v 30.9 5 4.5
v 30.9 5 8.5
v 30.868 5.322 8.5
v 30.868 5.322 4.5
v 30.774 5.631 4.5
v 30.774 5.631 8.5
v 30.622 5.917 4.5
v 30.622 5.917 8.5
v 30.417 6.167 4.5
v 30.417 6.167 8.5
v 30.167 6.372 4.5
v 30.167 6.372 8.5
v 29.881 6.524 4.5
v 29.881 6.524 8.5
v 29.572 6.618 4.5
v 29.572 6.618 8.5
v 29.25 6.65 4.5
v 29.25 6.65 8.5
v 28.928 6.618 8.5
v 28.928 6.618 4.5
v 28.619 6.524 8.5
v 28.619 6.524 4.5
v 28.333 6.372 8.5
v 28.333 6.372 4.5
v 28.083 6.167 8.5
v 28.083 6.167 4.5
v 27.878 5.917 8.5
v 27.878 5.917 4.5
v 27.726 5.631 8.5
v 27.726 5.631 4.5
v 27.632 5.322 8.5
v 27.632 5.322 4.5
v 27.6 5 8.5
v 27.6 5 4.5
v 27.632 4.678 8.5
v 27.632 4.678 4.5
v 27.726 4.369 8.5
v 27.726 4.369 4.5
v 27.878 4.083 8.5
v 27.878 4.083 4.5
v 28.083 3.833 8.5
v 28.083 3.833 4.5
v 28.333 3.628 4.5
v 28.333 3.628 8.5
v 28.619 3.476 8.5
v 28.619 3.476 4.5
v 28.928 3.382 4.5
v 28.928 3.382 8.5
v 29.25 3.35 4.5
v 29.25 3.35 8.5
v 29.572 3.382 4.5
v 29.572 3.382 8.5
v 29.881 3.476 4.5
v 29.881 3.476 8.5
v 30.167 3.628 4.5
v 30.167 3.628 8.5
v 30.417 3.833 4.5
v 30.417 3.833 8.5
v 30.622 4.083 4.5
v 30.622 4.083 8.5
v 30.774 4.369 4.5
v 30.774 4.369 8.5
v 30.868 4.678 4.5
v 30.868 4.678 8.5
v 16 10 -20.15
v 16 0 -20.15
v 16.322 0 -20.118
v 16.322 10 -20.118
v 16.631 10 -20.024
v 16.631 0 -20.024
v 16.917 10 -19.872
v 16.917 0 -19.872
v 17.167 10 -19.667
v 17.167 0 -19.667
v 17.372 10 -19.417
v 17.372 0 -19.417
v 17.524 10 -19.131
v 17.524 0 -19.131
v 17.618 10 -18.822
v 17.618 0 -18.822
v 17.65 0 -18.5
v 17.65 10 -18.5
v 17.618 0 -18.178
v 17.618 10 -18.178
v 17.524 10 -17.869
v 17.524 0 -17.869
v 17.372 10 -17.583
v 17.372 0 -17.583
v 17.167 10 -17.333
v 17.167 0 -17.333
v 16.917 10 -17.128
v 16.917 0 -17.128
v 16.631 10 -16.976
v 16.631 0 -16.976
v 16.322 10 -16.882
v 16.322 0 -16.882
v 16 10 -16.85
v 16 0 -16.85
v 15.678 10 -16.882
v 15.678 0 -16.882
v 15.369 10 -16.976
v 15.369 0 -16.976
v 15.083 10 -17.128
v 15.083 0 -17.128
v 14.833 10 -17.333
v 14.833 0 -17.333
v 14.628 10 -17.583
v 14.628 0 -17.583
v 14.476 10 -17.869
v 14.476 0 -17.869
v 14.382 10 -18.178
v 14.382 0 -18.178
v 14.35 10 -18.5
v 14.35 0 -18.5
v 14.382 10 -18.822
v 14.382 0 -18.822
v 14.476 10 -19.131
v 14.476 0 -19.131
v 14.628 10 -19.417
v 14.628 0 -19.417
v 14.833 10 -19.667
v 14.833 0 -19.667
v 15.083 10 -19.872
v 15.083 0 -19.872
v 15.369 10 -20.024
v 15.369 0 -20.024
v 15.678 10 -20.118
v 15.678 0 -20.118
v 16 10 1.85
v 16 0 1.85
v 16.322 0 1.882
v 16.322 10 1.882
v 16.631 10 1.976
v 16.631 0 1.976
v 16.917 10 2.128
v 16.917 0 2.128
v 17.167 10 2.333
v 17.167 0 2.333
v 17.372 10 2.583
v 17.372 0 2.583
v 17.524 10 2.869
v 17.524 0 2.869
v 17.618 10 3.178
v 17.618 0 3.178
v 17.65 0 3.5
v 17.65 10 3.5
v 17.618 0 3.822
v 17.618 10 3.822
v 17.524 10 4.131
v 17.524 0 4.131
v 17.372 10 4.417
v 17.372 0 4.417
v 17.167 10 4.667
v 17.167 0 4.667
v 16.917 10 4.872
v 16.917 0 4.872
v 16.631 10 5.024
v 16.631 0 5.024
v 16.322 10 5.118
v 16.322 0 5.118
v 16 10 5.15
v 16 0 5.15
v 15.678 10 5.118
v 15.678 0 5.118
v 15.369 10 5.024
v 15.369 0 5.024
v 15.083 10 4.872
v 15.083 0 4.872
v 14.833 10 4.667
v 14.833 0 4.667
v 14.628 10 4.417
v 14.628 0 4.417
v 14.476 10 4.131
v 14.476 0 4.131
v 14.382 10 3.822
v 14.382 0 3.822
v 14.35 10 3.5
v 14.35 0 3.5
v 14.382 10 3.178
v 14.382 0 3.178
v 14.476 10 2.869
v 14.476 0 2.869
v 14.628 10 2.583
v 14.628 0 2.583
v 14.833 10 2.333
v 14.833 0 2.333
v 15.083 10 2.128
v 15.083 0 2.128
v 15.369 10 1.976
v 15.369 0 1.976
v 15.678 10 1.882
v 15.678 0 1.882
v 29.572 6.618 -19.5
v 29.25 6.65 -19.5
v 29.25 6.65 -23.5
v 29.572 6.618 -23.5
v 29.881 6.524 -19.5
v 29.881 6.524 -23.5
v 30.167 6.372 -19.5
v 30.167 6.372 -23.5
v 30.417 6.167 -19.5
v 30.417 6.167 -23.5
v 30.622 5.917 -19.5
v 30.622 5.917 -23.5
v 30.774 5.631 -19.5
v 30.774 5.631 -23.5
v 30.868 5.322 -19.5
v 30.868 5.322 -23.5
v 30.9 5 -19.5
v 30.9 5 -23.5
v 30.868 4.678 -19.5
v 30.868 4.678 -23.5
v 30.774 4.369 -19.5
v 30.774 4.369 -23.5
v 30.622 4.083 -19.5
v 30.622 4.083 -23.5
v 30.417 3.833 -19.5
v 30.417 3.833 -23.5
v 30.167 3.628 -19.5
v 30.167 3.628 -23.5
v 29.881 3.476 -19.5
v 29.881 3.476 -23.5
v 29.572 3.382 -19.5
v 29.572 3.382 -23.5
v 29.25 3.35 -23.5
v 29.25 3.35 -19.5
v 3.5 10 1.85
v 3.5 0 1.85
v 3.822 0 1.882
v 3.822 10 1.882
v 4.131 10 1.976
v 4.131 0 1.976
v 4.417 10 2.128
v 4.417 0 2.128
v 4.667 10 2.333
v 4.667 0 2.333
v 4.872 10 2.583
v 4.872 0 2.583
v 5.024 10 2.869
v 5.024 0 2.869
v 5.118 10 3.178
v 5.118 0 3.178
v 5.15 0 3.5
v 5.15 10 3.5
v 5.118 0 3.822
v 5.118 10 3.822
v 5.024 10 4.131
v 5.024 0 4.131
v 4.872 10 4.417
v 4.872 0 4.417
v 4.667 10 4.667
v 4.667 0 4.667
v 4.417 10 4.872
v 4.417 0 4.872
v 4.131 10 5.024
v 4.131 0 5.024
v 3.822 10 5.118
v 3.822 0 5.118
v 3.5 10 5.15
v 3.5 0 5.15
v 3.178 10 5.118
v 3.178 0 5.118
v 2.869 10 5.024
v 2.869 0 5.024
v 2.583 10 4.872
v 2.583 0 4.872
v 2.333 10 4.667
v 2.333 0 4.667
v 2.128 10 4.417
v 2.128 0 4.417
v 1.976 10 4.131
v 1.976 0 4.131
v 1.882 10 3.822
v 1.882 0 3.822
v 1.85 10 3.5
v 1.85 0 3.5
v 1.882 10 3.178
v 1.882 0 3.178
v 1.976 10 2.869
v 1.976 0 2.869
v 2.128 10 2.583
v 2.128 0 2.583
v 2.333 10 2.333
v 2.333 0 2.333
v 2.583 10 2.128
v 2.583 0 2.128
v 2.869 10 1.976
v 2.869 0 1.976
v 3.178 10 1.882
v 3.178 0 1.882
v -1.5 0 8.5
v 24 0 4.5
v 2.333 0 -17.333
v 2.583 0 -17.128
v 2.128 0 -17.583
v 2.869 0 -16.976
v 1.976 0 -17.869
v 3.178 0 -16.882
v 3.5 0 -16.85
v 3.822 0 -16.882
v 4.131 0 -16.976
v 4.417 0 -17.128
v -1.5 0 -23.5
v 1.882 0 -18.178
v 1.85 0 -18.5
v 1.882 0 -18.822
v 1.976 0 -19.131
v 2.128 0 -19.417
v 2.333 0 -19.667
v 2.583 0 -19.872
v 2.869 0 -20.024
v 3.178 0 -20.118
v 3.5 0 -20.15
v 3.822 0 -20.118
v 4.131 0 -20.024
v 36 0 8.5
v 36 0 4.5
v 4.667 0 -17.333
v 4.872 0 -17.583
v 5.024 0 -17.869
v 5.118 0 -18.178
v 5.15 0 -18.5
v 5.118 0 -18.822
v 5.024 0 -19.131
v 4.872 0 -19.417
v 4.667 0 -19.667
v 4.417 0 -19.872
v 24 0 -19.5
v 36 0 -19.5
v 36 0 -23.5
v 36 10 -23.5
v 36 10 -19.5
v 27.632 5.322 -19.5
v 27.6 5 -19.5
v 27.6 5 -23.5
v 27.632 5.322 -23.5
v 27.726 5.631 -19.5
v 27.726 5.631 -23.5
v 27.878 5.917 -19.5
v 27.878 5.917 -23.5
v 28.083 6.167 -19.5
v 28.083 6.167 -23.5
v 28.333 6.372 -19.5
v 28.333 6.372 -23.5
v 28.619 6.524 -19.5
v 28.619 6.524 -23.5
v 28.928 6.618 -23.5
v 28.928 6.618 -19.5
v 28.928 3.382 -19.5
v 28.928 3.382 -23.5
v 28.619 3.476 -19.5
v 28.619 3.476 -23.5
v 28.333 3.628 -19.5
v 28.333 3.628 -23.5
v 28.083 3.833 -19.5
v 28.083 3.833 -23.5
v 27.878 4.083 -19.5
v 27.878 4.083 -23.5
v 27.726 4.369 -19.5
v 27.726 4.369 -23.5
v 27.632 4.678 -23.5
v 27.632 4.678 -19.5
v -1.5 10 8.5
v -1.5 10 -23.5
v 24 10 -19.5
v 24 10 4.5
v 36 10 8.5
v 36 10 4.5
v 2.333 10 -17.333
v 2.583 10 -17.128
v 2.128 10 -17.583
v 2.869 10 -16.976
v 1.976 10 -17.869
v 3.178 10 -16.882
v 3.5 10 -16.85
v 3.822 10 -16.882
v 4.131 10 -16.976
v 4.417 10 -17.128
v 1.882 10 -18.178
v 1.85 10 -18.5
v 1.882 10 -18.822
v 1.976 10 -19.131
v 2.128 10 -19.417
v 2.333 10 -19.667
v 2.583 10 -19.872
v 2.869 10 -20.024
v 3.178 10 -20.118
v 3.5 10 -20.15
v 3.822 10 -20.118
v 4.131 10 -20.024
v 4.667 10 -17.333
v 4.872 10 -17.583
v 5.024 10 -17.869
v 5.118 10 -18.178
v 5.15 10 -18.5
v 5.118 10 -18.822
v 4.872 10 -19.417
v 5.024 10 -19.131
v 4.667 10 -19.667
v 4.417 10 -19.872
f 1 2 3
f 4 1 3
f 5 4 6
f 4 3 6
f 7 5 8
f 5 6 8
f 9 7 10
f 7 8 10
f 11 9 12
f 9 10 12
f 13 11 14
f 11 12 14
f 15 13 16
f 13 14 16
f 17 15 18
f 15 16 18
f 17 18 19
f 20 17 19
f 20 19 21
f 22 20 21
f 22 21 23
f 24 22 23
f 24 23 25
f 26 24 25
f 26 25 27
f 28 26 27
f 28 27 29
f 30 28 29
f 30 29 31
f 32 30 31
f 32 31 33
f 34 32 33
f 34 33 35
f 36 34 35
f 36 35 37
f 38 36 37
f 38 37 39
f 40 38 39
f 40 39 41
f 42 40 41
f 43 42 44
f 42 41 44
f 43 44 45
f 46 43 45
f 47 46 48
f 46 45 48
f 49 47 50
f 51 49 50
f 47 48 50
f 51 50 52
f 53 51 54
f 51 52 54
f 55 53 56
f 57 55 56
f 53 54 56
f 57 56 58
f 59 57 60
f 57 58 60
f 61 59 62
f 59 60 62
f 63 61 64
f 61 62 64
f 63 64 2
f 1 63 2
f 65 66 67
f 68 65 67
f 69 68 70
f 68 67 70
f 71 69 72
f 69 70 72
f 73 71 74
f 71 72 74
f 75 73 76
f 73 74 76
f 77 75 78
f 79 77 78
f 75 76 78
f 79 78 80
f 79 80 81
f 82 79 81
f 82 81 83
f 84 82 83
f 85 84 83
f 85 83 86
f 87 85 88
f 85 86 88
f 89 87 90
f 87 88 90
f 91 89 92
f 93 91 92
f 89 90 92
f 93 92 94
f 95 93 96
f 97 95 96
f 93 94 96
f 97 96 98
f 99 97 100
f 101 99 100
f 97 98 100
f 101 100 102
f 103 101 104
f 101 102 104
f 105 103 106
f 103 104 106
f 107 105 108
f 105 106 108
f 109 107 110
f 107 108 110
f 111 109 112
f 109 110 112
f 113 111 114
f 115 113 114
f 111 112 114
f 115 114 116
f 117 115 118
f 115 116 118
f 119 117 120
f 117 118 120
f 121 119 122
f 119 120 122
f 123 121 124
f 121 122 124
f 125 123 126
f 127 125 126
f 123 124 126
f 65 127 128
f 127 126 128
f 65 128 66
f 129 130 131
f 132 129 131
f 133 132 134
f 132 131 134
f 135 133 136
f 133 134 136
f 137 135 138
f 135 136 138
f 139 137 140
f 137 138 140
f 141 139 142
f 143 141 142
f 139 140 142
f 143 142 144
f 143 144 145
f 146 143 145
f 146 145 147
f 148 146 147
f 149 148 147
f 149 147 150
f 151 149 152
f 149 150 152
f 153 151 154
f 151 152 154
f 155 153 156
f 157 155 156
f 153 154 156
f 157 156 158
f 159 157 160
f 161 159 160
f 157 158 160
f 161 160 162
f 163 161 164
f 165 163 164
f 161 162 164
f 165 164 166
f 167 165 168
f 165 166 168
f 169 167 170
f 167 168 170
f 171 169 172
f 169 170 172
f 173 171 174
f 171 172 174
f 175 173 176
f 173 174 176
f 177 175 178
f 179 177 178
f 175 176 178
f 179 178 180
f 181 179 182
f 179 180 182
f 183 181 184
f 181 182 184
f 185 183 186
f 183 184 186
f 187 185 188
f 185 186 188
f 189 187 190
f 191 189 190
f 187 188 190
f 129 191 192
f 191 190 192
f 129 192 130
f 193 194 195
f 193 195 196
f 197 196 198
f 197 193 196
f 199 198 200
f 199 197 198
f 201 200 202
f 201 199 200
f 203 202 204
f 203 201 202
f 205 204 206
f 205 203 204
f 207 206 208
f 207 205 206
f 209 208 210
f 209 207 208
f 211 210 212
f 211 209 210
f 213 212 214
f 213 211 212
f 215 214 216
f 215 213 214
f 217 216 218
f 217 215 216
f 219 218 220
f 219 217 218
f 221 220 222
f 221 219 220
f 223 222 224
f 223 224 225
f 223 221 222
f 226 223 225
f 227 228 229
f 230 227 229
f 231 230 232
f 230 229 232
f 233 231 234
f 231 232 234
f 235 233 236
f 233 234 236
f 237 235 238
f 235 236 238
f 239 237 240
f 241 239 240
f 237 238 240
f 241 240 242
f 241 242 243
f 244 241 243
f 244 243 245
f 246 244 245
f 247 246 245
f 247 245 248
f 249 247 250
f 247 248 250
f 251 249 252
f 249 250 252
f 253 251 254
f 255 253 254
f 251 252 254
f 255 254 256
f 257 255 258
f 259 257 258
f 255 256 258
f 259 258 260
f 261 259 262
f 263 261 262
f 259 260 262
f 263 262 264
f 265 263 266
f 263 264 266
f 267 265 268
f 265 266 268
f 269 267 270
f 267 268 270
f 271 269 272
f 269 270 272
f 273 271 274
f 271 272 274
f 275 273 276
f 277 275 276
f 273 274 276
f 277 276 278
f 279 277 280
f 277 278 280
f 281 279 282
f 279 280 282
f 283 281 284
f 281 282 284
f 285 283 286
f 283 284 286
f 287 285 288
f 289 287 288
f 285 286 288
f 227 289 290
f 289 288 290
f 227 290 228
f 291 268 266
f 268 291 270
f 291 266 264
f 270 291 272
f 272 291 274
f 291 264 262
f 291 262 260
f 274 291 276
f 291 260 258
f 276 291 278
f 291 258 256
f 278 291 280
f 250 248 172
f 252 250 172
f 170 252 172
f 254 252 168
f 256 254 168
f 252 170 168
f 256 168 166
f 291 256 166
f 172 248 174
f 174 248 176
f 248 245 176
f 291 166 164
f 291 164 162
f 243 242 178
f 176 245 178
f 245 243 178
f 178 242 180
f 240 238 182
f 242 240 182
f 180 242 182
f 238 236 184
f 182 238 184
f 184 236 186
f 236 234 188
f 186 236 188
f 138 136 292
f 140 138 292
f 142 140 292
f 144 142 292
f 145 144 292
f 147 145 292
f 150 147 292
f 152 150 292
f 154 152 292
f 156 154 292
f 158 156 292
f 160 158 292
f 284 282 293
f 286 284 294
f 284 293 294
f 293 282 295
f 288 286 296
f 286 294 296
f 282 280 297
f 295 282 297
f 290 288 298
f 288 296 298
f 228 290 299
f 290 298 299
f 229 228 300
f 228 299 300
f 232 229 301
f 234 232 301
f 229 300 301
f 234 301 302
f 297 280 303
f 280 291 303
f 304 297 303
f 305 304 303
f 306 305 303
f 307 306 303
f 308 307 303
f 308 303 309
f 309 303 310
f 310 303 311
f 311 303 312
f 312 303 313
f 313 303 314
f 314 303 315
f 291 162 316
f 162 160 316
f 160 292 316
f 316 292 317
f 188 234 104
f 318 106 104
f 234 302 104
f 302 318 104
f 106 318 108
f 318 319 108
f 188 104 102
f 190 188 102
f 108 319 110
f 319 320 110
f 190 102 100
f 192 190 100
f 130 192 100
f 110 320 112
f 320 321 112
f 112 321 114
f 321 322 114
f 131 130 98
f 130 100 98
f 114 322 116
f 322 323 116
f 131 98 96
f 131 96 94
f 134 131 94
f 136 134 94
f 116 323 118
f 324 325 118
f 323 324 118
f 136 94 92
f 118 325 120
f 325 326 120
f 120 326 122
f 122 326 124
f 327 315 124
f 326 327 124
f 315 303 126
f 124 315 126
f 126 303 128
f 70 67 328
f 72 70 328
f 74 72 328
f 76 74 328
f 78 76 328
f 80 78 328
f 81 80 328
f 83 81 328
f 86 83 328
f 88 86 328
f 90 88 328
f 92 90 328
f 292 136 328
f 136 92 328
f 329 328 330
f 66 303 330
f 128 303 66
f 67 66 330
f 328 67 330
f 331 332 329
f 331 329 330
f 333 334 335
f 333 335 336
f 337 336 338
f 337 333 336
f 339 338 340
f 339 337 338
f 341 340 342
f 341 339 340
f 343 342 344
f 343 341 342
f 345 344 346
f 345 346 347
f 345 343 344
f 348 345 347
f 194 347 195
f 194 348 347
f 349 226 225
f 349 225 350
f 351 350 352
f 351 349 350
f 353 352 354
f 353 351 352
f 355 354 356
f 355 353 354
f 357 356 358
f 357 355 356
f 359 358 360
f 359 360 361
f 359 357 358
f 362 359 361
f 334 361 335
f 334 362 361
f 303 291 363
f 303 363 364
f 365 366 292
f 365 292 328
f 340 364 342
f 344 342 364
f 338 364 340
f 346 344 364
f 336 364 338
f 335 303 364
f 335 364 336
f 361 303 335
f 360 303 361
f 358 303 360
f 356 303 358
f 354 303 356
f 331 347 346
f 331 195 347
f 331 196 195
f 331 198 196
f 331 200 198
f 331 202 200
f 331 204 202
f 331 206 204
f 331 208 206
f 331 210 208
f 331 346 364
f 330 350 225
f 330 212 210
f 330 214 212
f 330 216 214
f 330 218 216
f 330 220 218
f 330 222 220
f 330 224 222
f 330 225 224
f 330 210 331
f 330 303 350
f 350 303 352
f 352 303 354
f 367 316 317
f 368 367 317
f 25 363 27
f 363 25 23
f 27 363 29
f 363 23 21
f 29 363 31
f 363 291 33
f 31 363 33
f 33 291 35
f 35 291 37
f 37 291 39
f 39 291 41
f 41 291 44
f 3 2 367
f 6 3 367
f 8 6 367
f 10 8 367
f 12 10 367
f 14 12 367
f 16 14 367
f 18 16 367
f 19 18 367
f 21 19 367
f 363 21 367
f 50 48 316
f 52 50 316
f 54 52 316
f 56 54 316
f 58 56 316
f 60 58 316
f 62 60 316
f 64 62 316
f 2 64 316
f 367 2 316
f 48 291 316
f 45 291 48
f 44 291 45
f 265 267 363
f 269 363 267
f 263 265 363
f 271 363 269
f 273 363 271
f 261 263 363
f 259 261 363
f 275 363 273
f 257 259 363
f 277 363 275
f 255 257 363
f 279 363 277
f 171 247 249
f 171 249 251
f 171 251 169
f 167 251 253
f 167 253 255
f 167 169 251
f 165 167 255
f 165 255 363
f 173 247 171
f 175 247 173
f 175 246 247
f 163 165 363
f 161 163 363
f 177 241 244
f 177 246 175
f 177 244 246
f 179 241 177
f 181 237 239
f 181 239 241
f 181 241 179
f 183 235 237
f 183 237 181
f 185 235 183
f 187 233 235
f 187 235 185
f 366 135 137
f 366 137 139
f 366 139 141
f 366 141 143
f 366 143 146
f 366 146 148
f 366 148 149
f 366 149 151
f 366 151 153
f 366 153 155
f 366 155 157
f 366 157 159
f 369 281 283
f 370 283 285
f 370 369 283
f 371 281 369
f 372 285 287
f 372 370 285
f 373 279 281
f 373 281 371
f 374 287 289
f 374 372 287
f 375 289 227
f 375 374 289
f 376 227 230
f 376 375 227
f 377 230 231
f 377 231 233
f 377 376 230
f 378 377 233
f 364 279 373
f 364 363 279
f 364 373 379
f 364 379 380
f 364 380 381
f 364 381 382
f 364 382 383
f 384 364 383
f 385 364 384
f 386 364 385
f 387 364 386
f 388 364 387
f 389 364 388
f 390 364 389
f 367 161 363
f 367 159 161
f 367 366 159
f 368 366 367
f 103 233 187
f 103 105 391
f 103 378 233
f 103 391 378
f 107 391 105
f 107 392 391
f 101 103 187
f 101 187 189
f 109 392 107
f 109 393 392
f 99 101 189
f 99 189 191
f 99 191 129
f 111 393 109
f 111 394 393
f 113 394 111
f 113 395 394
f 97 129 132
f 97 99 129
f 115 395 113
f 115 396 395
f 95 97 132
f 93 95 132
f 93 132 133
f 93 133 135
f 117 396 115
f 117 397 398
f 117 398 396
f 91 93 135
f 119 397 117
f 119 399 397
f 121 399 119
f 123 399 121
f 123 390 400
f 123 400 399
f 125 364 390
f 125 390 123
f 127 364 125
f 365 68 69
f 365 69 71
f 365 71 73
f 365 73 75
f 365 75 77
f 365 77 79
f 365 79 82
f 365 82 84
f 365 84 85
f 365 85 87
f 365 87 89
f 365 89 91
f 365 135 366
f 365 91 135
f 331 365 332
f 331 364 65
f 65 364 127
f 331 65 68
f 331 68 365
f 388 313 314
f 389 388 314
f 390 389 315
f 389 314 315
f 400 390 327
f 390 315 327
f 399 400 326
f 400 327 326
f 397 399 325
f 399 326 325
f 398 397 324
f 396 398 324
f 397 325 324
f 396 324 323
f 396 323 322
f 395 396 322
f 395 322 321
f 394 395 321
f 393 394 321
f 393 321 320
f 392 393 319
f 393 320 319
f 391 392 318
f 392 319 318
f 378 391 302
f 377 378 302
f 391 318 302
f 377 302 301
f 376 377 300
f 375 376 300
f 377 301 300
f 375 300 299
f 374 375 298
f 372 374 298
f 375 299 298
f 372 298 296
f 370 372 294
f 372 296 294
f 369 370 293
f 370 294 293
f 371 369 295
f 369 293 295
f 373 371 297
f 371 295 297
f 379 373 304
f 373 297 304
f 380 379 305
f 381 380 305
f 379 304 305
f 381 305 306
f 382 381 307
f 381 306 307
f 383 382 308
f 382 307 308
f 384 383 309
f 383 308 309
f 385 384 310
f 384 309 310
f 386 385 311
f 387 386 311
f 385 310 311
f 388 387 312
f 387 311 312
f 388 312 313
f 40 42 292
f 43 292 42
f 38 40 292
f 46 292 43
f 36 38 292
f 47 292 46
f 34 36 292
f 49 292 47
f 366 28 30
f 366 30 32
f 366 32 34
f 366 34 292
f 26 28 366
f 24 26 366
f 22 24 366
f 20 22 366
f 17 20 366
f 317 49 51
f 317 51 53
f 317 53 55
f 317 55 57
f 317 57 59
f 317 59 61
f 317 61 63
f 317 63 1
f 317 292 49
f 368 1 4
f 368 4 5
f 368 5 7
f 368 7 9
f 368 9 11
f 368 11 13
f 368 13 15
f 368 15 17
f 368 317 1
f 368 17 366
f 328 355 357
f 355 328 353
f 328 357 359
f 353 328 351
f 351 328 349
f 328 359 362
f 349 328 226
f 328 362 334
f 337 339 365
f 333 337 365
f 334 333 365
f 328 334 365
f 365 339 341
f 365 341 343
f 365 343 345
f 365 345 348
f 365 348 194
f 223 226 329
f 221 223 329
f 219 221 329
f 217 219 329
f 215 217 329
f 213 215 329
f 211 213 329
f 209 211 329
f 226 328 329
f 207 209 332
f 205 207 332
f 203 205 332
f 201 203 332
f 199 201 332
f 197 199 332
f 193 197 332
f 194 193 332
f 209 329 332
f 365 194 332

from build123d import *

# Parameters (mm, degrees)
CROQUIS2_W              = 37.5
CROQUIS2_H              = 32
SALIENTE_EXTRUIR1_DEPTH = 10
CROQUIS7_R              = 1.65
CUT_EXTRUDE_1_DEPTH     = 10
CROQUIS13_R             = 1.65
CUT_EXTRUDE_3_DEPTH     = 6
CUT_EXTRUDE_START       = -6
CUT_EXTRUDE_4_DEPTH     = 6
SKETCH_7_W              = 24
SKETCH_7_H              = 10
CUT_EXTRUDE_5_DEPTH     = 12


with BuildPart() as part:
    # Croquis2 → Saliente-Extruir1 (new body)
    with BuildSketch(Plane(origin=(0, 0, 0), x_dir=(1, 0, 0), z_dir=(0, 1, 0))):
        with Locations((17.25, 7.5)):
            Rectangle(CROQUIS2_W, CROQUIS2_H)
    extrude(amount=SALIENTE_EXTRUIR1_DEPTH)

    # Croquis7 → 切除-拉伸1 (cut)
    with BuildSketch(Plane.XZ):
        with Locations(Location((3.5, -18.5, 0), (0, 0, 270))):
            Circle(CROQUIS7_R)
        with Locations(Location((16, -18.5, 0), (0, 0, 270))):
            Circle(CROQUIS7_R)
        with Locations(Location((3.5, 3.5, 0), (0, 0, 270))):
            Circle(CROQUIS7_R)
        with Locations(Location((16, 3.5, 0), (0, 0, 270))):
            Circle(CROQUIS7_R)
    extrude(amount=-CUT_EXTRUDE_1_DEPTH, mode=Mode.SUBTRACT)

    # Croquis13 → 切除-拉伸3 (cut)
    with BuildSketch(Plane.XY.offset(8.5)):
        with Locations((29.25, 5)):
            Circle(CROQUIS13_R)
    extrude(amount=-CUT_EXTRUDE_3_DEPTH, mode=Mode.SUBTRACT)

    # 草图6 → 切除-拉伸4 (cut)
    with BuildSketch(Plane(origin=(0, 0, -23.5), x_dir=(-1, 0, 0), z_dir=(0, 0, -1)).offset(CUT_EXTRUDE_START)):
        with BuildLine():
            ThreePointArc((-27.6, 5), (-28.083273811, 6.166726189), (-29.25, 6.65))
            Line((-29.25, 6.65), (-29.25, 3.35))
            ThreePointArc((-29.25, 3.35), (-28.083273811, 3.833273811), (-27.6, 5))
        make_face()
        with BuildLine():
            Line((-29.25, 3.35), (-29.25, 6.65))
            ThreePointArc((-29.25, 6.65), (-30.9, 5), (-29.25, 3.35))
        make_face()
    extrude(amount=CUT_EXTRUDE_4_DEPTH, mode=Mode.SUBTRACT)

    # 草图7 → 切除-拉伸5 (cut)
    with BuildSketch(Plane(origin=(36, 0, 0), x_dir=(0, 0, -1), z_dir=(1, 0, 0))):
        with Locations((7.5, 5)):
            Rectangle(SKETCH_7_W, SKETCH_7_H)
    extrude(amount=-CUT_EXTRUDE_5_DEPTH, mode=Mode.SUBTRACT)


solid = part.part
